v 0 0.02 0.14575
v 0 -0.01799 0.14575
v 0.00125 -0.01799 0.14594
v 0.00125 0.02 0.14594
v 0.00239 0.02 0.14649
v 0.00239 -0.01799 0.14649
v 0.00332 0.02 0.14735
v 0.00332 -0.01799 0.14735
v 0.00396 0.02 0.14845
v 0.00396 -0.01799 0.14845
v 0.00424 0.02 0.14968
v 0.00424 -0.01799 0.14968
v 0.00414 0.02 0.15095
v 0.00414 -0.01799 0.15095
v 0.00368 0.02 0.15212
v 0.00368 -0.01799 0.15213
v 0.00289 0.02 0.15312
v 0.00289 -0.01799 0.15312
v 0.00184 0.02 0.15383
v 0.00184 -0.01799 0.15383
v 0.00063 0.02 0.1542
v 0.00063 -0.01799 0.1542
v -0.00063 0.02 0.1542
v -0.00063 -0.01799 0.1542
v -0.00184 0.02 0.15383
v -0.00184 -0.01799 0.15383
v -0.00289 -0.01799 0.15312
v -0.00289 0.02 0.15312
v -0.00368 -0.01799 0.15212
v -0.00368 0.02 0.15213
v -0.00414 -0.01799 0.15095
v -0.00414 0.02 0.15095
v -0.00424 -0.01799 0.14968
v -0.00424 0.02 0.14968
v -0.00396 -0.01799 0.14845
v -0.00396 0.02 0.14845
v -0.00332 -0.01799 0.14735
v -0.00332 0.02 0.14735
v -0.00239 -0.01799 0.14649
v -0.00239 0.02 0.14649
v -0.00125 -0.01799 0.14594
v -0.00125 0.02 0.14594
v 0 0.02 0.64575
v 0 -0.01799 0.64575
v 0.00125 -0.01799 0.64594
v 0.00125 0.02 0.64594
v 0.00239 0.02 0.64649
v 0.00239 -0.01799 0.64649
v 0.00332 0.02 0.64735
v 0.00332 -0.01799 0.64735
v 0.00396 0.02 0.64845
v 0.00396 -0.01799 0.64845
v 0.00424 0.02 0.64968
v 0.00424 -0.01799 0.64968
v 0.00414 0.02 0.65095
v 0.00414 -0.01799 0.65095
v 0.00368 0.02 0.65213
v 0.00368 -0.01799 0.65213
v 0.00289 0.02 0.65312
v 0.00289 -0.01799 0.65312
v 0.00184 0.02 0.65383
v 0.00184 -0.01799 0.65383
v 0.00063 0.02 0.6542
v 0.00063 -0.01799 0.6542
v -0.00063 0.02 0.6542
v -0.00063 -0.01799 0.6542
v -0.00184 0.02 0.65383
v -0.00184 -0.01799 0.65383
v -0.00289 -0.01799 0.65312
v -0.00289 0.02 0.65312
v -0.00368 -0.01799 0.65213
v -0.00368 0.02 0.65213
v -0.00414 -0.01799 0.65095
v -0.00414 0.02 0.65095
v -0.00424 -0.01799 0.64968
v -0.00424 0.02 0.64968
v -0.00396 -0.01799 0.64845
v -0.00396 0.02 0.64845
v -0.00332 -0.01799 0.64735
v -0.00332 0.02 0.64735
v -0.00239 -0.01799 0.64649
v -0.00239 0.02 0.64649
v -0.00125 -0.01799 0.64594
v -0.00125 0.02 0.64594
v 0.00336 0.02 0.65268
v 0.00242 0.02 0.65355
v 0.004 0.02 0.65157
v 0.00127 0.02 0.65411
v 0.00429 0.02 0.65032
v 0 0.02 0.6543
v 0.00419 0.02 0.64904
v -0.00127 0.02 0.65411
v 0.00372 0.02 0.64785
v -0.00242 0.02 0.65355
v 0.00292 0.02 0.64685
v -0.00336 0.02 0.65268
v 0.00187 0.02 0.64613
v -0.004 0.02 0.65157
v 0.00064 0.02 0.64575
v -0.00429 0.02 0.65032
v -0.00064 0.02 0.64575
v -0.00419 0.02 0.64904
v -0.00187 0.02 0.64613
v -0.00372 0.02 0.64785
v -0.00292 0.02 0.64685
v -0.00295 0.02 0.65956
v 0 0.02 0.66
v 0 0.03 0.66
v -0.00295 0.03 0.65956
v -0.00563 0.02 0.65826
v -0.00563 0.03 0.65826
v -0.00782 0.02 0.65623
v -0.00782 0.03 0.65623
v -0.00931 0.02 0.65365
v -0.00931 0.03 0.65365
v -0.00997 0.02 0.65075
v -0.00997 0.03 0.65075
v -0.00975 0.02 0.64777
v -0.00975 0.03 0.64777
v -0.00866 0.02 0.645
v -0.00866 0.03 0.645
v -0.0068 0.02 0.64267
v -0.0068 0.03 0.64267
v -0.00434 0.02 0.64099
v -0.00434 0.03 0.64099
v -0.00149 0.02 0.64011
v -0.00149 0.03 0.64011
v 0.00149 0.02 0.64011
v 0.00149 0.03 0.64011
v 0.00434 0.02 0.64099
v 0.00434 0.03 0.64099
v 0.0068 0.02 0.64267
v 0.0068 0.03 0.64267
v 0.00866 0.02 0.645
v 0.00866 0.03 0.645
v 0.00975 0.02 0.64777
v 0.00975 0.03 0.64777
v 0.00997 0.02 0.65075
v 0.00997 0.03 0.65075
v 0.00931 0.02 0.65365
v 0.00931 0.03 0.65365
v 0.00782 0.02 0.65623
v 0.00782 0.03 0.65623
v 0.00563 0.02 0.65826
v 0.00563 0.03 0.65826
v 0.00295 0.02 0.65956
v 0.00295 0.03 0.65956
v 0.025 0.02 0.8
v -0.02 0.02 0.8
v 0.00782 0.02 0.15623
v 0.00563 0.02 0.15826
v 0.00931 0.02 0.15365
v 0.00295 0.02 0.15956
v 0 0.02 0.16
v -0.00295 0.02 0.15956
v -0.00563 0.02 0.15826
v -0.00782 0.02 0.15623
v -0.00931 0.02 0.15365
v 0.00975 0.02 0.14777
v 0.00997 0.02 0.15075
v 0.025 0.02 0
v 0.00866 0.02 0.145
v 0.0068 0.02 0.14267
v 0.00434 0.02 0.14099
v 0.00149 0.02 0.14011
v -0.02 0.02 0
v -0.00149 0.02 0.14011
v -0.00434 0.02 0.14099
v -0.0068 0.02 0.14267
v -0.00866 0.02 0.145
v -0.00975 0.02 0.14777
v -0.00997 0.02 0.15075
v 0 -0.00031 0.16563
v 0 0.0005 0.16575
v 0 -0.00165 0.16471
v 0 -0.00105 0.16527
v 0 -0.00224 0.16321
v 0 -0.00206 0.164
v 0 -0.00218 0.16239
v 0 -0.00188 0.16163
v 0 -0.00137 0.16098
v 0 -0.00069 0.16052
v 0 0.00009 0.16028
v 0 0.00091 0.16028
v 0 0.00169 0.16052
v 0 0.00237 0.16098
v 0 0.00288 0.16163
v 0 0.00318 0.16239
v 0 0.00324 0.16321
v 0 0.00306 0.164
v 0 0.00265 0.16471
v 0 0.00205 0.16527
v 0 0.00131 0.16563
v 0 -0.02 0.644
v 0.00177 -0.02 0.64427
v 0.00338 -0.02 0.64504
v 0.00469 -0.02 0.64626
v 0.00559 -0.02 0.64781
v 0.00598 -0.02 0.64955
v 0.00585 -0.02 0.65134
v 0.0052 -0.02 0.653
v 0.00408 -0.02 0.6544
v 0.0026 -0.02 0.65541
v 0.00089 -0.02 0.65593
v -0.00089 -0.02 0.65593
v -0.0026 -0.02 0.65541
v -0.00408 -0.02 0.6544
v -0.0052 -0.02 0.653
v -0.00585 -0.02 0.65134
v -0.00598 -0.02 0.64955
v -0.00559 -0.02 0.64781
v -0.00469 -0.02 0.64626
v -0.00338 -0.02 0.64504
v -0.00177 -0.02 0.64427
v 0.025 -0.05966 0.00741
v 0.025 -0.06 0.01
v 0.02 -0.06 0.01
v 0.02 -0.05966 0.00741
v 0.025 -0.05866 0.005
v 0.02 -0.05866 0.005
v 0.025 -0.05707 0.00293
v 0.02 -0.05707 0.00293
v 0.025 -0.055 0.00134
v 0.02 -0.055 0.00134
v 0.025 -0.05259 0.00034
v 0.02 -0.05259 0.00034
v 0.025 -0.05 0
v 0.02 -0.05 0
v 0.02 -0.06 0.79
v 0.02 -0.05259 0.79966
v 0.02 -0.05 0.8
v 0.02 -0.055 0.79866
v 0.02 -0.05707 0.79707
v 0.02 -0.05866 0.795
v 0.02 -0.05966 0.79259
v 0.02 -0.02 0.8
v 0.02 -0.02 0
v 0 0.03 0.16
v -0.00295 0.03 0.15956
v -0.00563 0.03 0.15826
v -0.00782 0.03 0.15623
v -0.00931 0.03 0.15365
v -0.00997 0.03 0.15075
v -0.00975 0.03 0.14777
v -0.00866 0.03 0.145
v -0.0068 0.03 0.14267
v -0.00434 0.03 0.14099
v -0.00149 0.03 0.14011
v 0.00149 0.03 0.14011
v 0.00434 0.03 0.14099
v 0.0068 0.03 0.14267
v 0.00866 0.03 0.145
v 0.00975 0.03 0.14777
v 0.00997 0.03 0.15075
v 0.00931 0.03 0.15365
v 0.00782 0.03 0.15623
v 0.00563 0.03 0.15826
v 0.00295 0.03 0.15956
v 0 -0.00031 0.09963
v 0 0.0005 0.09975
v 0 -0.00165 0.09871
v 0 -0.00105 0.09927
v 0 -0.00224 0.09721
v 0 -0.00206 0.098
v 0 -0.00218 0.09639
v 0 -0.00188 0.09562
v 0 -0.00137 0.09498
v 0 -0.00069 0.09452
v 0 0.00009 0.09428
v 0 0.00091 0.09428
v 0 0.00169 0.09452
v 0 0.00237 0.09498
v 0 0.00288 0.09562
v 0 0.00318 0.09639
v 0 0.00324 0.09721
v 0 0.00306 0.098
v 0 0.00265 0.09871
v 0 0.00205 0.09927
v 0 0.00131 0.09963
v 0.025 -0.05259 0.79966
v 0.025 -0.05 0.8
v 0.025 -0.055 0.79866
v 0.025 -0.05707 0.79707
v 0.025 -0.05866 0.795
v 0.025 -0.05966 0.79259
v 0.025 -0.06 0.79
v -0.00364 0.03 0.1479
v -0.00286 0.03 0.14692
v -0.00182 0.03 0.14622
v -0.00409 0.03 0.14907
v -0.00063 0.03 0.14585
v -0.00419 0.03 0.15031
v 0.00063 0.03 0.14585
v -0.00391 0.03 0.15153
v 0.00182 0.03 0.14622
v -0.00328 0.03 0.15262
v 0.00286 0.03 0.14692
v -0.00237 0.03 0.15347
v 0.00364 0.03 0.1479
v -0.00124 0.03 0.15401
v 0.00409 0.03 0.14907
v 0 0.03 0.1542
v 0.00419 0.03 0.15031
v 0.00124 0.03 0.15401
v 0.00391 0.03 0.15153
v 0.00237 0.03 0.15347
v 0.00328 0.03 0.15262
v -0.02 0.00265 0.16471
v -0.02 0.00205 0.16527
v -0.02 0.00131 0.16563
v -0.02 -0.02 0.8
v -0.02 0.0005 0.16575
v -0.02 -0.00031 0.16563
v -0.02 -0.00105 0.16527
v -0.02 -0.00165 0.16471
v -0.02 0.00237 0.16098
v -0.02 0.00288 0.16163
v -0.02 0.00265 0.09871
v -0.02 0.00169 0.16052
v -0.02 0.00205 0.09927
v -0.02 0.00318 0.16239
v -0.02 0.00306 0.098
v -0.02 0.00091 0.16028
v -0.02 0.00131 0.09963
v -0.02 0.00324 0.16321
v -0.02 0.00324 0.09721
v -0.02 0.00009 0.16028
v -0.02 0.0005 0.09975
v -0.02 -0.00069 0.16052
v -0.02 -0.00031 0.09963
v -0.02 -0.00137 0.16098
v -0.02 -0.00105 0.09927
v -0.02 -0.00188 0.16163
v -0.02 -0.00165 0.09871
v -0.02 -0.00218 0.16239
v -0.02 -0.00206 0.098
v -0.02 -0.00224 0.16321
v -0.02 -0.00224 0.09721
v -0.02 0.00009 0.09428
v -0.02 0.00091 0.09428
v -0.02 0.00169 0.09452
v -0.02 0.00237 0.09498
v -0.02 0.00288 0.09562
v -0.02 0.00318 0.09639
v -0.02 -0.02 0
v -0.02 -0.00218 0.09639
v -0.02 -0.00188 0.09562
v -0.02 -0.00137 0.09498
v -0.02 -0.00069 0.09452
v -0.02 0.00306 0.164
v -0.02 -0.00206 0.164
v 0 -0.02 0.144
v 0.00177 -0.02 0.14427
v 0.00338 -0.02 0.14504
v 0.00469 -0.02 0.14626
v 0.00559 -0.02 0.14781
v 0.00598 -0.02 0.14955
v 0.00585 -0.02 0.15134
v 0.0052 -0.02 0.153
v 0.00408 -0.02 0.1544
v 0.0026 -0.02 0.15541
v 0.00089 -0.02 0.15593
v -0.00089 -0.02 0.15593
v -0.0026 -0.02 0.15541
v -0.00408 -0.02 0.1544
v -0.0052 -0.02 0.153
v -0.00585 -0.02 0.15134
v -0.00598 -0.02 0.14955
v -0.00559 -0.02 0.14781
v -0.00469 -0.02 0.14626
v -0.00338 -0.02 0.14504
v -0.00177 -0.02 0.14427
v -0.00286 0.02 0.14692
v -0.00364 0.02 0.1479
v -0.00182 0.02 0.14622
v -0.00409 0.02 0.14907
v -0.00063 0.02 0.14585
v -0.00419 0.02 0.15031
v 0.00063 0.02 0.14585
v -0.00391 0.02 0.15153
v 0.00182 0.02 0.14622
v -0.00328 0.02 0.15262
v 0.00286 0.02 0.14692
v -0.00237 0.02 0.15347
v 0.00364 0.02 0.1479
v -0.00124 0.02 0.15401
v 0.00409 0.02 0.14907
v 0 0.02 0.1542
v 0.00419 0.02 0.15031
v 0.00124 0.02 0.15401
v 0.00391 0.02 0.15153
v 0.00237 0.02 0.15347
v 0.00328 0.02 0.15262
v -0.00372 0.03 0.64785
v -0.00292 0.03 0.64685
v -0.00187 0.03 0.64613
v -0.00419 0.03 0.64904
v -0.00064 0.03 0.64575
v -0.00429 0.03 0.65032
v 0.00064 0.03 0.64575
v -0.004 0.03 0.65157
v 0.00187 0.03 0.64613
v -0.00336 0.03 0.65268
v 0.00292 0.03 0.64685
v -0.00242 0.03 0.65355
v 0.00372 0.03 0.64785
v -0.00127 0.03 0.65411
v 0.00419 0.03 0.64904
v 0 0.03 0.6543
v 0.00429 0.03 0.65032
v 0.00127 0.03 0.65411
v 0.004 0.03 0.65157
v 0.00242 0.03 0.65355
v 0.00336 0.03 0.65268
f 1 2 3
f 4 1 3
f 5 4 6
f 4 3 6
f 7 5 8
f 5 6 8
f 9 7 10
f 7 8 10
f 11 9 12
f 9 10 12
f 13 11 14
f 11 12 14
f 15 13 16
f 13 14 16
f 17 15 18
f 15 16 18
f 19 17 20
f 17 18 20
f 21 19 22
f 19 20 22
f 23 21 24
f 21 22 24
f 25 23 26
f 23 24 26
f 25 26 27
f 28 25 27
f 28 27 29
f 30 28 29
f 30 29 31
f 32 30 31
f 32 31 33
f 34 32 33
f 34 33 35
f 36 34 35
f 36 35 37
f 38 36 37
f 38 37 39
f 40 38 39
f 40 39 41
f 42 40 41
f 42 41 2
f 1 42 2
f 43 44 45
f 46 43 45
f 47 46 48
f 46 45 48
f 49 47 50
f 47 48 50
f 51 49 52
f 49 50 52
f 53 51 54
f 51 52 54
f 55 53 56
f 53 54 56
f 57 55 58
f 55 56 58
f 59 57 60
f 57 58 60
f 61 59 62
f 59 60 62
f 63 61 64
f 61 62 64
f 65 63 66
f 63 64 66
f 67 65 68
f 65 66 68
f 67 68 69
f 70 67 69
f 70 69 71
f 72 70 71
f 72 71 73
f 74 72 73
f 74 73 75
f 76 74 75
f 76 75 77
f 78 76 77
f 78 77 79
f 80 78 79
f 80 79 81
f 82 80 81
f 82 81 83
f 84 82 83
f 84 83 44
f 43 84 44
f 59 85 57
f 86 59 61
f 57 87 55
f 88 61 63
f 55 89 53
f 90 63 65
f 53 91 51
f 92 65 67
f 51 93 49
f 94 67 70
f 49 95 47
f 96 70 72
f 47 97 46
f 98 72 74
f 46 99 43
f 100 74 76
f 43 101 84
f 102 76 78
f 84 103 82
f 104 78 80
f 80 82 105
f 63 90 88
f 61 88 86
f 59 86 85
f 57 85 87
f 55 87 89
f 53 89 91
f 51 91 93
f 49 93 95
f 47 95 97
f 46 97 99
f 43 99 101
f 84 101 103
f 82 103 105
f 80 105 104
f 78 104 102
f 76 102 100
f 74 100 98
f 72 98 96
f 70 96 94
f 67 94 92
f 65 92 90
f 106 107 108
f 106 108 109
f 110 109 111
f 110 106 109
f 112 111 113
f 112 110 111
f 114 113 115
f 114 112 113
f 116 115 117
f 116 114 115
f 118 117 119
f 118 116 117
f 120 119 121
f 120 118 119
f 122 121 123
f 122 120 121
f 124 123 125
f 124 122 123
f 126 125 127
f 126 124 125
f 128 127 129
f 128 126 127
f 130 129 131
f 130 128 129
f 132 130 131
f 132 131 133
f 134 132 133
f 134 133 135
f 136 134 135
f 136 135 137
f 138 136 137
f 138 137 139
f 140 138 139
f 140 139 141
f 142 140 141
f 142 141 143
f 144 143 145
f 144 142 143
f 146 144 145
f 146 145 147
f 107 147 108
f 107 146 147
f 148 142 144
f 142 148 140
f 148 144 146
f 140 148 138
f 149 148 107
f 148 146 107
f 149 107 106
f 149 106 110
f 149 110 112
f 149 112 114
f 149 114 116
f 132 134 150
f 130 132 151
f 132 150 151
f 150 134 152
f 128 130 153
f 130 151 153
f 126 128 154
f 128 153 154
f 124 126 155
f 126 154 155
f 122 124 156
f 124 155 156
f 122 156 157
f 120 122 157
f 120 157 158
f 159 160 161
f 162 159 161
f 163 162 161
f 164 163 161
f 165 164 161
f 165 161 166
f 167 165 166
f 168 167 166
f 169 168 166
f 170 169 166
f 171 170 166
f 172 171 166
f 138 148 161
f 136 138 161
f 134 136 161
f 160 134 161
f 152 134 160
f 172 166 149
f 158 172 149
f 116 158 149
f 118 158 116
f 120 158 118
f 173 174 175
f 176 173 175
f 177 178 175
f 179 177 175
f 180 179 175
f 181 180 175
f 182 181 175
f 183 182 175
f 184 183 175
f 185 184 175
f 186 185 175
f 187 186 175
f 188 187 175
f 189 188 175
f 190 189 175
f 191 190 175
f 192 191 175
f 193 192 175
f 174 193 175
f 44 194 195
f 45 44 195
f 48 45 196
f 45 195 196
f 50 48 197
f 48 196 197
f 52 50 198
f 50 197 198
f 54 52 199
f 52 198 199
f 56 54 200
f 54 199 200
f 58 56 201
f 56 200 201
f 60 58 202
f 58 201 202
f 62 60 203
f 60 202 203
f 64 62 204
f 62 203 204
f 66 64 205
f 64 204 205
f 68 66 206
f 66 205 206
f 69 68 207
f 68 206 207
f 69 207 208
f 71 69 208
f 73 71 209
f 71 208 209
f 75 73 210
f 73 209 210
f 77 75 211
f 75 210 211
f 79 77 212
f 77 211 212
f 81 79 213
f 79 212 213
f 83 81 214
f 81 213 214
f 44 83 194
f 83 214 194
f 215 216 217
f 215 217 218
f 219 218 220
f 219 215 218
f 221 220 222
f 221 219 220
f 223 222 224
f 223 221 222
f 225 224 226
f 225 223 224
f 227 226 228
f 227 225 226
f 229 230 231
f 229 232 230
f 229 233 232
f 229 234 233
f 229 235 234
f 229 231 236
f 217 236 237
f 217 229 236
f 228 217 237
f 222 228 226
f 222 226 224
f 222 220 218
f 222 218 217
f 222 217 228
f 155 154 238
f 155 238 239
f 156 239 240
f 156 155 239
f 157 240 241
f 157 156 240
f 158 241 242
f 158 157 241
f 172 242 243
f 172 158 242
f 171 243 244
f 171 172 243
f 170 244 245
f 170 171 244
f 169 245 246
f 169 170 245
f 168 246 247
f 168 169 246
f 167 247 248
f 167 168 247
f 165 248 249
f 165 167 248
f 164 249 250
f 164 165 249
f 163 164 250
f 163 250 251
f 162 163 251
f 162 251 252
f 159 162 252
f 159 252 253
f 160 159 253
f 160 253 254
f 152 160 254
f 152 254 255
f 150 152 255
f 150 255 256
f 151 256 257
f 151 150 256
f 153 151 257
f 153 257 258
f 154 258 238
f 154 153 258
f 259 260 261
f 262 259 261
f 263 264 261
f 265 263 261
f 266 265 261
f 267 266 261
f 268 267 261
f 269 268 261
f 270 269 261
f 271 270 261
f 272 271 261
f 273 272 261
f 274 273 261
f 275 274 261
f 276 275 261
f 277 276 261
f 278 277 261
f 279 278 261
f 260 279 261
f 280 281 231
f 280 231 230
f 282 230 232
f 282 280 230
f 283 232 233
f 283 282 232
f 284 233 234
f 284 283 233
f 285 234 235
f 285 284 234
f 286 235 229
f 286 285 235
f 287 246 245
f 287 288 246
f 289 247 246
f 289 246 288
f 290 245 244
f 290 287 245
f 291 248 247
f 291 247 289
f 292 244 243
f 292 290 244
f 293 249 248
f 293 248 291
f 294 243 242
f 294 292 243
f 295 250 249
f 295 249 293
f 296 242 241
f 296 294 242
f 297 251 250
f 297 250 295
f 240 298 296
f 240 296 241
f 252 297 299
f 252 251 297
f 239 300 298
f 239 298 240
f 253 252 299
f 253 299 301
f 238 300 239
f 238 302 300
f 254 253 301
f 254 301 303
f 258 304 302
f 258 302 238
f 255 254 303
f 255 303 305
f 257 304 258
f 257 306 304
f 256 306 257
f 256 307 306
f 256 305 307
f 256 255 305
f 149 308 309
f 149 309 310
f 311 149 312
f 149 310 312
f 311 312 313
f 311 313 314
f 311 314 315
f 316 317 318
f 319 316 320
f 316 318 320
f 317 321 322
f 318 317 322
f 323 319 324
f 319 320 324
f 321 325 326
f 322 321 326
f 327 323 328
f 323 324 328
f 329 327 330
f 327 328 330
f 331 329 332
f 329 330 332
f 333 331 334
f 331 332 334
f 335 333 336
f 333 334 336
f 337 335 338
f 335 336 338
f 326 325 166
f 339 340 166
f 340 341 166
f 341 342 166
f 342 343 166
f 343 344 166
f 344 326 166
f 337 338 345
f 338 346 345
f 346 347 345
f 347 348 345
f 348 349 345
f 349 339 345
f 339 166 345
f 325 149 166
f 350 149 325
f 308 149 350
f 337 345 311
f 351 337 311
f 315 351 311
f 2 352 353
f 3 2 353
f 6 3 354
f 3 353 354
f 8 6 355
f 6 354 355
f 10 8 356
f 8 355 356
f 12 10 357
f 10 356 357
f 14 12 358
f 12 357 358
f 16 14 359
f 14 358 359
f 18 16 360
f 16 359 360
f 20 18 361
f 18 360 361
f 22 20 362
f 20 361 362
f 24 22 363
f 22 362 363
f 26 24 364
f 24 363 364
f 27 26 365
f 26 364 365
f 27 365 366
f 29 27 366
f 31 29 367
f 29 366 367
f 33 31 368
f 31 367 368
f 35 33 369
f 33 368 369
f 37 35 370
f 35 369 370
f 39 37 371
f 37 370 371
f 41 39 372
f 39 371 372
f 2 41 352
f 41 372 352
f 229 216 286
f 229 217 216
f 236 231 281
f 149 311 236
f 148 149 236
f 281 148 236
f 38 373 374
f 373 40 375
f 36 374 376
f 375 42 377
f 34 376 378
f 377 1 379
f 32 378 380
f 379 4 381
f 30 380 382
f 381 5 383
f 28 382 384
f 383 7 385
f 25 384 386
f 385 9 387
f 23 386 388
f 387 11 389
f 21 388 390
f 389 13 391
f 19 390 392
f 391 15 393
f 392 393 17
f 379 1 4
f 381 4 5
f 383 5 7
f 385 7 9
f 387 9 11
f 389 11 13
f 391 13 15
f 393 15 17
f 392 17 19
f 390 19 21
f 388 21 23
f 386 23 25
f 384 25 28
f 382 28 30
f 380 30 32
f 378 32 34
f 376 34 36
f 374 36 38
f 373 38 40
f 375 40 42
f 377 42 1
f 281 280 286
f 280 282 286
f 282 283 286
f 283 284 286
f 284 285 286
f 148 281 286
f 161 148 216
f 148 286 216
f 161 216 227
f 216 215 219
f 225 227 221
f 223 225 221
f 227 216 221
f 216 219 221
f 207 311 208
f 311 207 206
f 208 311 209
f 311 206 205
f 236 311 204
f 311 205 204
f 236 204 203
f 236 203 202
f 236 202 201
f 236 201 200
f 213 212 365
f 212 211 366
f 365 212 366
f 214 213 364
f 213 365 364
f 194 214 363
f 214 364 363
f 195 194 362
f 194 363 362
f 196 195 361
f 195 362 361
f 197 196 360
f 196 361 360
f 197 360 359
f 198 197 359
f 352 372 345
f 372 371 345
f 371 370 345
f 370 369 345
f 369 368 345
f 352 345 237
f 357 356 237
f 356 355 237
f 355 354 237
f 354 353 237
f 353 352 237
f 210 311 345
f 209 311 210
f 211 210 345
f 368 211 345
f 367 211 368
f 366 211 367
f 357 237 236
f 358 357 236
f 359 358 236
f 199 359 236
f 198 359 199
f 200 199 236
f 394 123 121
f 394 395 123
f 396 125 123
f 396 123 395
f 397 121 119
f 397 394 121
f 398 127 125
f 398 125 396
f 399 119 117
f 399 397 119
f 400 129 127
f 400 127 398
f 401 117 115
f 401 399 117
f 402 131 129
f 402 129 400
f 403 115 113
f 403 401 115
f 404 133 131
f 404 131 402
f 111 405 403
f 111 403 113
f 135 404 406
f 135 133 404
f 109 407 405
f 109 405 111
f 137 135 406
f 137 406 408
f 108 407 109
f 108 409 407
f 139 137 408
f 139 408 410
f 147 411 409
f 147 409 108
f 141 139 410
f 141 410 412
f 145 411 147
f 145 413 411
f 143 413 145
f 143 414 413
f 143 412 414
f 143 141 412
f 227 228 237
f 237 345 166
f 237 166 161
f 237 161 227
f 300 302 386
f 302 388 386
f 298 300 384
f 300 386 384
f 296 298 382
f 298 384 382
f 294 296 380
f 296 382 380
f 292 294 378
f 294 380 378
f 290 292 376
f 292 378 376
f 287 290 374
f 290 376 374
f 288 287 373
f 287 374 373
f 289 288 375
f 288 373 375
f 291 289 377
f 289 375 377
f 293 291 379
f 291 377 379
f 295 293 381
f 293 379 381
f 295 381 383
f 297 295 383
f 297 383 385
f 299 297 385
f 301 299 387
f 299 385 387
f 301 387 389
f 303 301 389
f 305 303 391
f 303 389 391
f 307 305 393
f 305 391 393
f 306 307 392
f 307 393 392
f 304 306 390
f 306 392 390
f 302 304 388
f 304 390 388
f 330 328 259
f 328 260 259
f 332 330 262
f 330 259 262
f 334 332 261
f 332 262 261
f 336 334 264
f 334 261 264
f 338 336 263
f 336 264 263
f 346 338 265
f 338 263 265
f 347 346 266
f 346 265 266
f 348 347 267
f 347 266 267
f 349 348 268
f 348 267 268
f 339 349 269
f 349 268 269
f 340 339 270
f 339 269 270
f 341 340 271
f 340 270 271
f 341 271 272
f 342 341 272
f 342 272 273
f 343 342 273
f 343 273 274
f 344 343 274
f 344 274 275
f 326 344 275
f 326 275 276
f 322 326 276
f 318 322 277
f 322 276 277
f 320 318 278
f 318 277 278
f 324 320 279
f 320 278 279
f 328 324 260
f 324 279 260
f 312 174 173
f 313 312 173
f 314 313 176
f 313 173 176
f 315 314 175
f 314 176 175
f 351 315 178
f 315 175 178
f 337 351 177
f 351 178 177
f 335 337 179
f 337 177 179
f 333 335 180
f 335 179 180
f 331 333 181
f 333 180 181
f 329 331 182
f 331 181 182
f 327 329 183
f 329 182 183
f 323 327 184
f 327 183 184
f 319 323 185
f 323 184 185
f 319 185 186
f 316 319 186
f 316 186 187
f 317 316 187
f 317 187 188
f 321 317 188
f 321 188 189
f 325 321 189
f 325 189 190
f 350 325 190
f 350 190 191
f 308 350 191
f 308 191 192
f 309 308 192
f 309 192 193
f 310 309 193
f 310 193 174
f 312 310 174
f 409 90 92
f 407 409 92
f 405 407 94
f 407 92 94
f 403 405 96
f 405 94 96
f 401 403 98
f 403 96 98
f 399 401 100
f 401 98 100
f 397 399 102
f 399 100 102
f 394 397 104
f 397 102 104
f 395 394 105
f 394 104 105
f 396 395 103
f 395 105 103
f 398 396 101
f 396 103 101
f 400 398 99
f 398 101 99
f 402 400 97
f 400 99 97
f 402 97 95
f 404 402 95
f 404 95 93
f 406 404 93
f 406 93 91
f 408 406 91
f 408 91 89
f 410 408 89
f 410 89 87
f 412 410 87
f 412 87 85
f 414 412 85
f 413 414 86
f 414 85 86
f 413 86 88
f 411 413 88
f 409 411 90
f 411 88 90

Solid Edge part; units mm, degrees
sketch "Sketch1" plane through (0, 0, 0) normal (0, 0, 1) x (1, 0, 0)
  line L0 (-0.02, -0.02) -> (0.02, -0.02)
  line L1 (0.02, -0.02) -> (0.02, 0.02)
  line L2 (0.02, 0.02) -> (-0.02, 0.02)
  line L3 (-0.02, 0.02) -> (-0.02, -0.02)
  dimension "D1" = 0.04
extrude "Protrusion1" add sketch "Sketch1" along normal blind 0.8
sketch "Sketch2" plane through (0.02, 0, 0.4) normal (1, 0, 0) x (0, 0, -1)
  line L0 (-0.4, 0.02) -> (0.4, 0.02)
  line L1 (0.4, -0.06) -> (0.4, 0.02)
  line L2 (0.4, -0.06) -> (-0.4, -0.06)
  line L3 (-0.4, 0.02) -> (-0.4, -0.06)
  dimension "D1" = 0.08
extrude "Ausprägung_2" add sketch "Sketch2" along normal blind 0.005
fillet "Verrundung_1" radius 0.01 2 edges at (0.0225, -0.06, 0) (0.0225, -0.06, 0.8)
hole "Bohrung_1" at (0, -0.02, 0.65) direction (0, 1, 0) diameter 0.0085 end through all countersink diameter 0.012 countersink angle 82
hole "Hole1" at (0, -0.02, 0.15) direction (0, 1, 0) diameter 0.0085 end through all countersink diameter 0.012 countersink angle 82
sketch "Sketch3" plane through (0.002, 0.02, 0.4) normal (0, 1, 0) x (0, 0, 1)
  circle A0 centre (0.25, -0.002) radius 0.0043
  circle A1 centre (-0.25, -0.002) radius 0.01
  circle A2 centre (0.25, -0.002) radius 0.01
  circle A3 centre (-0.25, -0.002) radius 0.0042
  dimension "D1" = 0.02
extrude "Ausprägung_3" add sketch "Sketch3" along normal blind 0.01
hole "Bohrung_3" at (-0.02, 0.0005, 0.097) direction (1, 0, 0) diameter 0.0055 depth 0.02
hole "Hole2" at (-0.02, 0.0005, 0.163) direction (1, 0, 0) diameter 0.0055 depth 0.02
